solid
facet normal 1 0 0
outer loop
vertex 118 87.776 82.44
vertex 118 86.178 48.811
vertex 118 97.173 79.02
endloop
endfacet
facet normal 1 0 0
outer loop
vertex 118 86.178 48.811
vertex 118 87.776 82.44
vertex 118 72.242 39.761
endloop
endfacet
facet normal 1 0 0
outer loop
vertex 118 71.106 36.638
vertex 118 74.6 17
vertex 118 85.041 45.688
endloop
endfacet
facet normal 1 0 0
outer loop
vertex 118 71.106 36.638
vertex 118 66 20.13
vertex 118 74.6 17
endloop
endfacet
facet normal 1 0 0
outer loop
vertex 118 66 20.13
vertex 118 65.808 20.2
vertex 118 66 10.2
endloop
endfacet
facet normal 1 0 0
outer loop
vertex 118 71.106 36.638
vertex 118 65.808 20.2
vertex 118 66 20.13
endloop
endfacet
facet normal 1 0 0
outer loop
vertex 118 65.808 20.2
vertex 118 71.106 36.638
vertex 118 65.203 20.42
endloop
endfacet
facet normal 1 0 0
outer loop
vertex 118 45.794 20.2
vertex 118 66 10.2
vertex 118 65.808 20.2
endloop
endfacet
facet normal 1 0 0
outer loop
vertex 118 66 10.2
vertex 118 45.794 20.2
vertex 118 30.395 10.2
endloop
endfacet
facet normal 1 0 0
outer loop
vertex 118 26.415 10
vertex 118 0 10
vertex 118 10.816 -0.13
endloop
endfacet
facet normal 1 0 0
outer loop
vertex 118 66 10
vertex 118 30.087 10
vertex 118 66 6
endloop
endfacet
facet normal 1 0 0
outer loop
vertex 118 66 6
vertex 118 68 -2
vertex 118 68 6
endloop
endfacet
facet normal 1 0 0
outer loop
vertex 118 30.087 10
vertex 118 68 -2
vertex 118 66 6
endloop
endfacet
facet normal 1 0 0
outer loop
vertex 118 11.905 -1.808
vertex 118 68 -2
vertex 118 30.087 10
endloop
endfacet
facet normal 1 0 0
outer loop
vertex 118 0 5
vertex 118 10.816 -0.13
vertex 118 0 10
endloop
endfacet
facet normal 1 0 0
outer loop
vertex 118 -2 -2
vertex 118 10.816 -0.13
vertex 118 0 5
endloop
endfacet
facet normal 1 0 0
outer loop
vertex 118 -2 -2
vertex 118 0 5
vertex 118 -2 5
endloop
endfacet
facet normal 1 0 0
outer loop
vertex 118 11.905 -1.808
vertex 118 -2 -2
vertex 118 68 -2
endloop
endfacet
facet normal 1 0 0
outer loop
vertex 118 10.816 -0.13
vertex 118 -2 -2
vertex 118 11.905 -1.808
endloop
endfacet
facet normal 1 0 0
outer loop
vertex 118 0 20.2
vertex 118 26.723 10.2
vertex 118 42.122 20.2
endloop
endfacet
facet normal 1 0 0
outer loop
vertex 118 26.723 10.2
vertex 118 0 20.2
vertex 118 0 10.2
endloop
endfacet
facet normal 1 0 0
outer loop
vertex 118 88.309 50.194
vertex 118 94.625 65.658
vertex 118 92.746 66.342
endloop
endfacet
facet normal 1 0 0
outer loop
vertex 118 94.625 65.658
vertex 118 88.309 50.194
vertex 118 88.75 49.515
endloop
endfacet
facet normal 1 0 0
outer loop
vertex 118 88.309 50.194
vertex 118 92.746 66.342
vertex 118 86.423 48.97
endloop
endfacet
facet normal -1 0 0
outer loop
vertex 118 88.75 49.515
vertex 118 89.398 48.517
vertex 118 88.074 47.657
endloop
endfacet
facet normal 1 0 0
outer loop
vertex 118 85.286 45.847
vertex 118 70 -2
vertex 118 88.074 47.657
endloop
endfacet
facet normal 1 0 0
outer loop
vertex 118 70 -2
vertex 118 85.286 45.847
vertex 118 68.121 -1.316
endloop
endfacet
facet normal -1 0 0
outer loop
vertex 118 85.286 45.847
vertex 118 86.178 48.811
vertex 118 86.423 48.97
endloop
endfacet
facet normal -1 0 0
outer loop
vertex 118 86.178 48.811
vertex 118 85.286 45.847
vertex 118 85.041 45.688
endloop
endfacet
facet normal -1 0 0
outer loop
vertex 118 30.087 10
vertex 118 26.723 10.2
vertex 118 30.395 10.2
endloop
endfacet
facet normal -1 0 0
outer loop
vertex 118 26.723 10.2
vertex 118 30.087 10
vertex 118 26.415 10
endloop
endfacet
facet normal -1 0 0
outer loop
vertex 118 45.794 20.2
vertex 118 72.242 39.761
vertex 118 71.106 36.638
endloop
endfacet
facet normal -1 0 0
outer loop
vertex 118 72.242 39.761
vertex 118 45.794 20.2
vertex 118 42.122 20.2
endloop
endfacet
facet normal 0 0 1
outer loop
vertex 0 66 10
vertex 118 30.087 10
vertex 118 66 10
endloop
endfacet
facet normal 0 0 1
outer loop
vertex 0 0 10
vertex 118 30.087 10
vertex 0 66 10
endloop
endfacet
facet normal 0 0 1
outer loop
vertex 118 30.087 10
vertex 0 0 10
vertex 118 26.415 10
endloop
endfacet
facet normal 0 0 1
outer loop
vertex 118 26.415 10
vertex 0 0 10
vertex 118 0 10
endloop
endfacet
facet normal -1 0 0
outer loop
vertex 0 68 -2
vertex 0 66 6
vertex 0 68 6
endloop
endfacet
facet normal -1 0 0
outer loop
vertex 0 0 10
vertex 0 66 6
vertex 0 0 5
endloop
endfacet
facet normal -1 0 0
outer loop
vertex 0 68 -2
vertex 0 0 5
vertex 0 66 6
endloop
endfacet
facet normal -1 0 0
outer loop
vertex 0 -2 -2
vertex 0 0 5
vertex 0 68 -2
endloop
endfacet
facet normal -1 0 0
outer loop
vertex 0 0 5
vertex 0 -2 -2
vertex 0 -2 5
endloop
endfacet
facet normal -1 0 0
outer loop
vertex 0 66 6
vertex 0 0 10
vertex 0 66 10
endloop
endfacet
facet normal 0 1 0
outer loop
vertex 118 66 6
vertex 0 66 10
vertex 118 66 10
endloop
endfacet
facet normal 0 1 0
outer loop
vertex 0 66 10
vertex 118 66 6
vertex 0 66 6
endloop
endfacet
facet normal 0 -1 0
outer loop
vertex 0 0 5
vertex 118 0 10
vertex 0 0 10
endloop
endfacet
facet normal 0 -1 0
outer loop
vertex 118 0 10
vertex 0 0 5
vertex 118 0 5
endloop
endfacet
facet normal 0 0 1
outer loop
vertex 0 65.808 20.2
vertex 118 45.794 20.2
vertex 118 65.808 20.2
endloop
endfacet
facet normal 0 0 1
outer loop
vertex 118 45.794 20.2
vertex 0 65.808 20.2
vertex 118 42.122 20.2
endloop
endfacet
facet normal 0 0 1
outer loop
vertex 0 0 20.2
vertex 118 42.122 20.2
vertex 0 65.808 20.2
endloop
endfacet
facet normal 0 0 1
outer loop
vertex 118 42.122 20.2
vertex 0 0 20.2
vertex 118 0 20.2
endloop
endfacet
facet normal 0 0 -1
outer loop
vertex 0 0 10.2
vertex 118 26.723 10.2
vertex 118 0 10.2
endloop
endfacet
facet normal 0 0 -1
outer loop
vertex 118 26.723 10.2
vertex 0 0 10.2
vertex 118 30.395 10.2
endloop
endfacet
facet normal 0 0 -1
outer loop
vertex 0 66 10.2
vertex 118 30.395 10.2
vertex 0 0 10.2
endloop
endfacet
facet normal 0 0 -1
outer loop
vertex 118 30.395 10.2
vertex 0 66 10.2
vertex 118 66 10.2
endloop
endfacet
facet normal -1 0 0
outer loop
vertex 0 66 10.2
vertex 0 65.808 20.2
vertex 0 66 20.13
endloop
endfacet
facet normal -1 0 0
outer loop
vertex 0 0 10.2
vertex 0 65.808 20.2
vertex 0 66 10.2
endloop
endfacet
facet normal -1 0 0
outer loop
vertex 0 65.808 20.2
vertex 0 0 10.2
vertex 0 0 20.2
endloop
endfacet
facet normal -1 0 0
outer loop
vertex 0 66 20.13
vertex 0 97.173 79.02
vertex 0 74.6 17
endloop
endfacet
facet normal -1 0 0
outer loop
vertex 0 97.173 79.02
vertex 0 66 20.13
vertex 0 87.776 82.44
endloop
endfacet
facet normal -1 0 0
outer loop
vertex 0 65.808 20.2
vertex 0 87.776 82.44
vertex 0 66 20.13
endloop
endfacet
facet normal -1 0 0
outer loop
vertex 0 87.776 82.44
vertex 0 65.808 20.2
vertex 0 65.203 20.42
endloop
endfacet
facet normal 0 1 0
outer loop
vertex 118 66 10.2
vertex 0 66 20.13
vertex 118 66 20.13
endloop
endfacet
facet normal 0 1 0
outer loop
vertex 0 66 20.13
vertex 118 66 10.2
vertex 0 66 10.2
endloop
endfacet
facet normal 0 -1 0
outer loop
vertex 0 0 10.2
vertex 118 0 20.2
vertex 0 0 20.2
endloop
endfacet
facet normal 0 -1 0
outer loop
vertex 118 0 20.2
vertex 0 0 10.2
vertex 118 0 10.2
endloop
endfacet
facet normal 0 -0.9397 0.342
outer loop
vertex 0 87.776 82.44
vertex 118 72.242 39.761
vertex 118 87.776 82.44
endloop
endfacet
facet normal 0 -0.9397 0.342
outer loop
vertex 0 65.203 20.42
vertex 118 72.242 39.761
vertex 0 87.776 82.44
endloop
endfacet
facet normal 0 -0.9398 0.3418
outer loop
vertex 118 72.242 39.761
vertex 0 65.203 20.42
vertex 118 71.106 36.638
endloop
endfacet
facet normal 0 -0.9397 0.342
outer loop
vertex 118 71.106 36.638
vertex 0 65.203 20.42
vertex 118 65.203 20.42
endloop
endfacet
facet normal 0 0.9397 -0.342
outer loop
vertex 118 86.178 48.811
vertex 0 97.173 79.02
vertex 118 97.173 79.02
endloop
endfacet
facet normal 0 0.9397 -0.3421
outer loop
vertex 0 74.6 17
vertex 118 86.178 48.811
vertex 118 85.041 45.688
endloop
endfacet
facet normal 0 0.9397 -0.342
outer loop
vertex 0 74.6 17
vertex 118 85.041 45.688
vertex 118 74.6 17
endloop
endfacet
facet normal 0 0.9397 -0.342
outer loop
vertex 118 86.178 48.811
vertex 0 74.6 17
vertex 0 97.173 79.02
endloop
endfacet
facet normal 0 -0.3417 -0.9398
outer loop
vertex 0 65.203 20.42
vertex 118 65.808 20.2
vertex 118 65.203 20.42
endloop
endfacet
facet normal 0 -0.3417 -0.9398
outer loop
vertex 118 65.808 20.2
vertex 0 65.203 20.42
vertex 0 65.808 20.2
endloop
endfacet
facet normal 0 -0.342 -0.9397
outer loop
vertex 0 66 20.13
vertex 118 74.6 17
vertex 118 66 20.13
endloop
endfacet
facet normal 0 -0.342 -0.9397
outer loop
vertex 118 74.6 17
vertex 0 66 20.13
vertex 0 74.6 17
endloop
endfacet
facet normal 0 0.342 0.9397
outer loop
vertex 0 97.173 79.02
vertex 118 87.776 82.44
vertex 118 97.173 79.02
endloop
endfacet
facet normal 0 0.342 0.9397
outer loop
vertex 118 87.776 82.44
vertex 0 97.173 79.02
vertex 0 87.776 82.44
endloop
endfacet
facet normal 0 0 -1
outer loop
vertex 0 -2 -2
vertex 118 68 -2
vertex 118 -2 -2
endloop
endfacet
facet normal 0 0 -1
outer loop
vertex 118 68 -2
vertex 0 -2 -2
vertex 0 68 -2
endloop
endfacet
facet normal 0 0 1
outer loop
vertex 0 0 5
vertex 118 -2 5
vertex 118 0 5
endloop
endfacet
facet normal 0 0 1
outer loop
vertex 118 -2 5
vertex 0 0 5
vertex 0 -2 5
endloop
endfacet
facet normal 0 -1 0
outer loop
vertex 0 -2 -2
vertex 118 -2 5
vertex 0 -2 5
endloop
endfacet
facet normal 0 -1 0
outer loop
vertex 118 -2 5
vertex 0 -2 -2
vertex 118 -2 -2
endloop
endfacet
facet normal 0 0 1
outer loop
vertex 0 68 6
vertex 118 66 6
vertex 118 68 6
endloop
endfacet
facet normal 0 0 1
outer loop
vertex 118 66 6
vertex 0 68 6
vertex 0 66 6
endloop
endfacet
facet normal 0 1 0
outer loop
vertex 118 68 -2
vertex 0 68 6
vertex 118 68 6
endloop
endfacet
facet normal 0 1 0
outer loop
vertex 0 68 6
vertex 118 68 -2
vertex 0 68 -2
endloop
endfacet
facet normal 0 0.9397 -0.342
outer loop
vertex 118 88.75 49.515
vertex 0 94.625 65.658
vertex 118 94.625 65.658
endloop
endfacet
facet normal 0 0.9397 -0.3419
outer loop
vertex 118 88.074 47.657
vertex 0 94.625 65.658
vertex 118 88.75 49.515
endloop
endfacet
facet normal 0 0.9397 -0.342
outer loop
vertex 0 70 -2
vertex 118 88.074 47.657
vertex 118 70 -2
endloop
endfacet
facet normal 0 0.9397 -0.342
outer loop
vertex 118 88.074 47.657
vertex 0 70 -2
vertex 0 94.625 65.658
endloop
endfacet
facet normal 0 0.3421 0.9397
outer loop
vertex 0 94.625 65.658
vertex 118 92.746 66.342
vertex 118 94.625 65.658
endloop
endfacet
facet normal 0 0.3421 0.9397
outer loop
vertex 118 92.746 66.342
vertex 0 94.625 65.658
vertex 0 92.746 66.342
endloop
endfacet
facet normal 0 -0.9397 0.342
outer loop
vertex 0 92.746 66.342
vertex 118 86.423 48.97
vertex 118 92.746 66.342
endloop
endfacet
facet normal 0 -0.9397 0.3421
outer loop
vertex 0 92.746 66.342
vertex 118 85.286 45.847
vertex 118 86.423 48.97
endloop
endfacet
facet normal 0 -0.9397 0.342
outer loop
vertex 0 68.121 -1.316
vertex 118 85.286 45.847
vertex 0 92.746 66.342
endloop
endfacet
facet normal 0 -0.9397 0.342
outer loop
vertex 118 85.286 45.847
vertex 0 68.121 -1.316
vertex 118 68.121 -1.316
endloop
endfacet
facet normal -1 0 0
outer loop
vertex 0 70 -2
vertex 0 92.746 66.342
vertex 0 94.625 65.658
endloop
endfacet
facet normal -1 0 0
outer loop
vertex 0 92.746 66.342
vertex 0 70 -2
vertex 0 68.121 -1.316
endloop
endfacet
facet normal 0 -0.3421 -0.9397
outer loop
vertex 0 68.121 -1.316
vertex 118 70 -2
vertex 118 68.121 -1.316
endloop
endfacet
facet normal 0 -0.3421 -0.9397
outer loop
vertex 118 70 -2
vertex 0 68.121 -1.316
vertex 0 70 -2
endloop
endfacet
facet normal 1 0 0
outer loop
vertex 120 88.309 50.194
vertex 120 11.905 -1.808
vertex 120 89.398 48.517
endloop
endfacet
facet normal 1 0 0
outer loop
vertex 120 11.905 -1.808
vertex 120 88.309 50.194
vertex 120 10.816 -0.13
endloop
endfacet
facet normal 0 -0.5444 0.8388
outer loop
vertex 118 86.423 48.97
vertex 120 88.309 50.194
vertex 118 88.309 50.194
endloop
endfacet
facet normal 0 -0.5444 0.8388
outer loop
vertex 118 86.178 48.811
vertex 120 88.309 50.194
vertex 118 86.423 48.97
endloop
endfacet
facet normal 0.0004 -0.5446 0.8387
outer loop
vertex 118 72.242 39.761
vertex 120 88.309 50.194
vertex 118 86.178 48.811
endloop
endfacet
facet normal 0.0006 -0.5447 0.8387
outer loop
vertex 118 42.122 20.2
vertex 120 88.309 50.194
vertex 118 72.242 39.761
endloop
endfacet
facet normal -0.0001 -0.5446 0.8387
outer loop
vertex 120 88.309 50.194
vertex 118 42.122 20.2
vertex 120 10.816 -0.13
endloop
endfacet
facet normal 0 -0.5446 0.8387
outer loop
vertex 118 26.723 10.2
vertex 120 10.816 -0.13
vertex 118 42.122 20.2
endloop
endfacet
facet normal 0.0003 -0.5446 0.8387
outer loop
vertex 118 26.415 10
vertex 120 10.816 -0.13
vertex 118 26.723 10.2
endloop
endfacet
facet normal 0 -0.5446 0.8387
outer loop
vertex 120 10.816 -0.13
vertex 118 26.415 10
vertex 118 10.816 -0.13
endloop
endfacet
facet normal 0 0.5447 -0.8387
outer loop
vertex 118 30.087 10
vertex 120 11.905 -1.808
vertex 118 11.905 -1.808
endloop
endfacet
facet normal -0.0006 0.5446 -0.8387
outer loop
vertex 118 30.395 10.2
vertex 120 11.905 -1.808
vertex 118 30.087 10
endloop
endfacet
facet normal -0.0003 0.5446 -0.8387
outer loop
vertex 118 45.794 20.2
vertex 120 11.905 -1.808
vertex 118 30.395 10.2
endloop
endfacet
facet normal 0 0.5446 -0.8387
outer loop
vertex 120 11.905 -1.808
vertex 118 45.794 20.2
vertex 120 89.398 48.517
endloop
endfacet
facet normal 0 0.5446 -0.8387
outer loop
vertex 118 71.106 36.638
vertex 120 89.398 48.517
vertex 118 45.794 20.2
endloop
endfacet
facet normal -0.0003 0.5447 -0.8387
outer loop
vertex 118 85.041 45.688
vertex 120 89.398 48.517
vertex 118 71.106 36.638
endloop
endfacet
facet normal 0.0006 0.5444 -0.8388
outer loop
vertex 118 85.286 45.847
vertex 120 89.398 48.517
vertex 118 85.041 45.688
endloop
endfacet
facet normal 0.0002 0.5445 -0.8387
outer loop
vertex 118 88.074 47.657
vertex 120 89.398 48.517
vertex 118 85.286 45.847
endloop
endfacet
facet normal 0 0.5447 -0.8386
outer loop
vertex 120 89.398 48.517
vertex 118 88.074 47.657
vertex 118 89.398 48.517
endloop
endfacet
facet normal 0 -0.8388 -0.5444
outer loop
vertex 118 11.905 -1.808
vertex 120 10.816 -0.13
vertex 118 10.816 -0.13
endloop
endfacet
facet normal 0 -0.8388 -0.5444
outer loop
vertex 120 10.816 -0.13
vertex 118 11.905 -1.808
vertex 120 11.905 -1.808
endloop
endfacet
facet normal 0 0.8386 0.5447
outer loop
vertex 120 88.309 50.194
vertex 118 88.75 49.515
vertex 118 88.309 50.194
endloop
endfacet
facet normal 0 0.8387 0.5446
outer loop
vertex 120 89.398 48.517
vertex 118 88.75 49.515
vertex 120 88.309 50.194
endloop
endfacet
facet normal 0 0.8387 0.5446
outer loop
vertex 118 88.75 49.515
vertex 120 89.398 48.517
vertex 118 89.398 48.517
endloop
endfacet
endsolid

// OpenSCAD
//Hoehe eine Matte
hm = 10;
//Hoehe Matte Diff
hmd = -1.4;
//Tiefe Matte
tm = 66;
//Tiefe Matte Diff
tmd = -3;
//Breite Matte
bm = 118;
//Dicke weisses Brett
dwb = 2;
//Dicker Leimholzbrett
dlb = 2;

//Rotation
r = 70;

//194x92,5x2 1x
//180x18x2   2x
//180x8x2    1x

module matte()
{
    color("#777777")
    cube([bm,tm,hm]);
}

module klappmatte()
{
    matte();

    translate([0,0,hm+0.2])
    matte();

    translate([0,tm+hm+hmd,hm*2+tmd])
    rotate([r,0,0])
    matte();
}

klappmatte();

module brett_sitzflaeche()
{
    color("#BA8C63")
    translate([0,0,-dlb])
    cube([bm,tm,dlb]);
}

brett_sitzflaeche();

module brett_sitzflaeche_begrenzung_hinten_vorne(s, isWhitePlank)
{
    if (isWhitePlank)
    {
        //color("#BA8C63")
        cube([bm,dwb,hm*0.5+dwb+s]);
    }
    else
    {
        color("#BA8C63")
        cube([bm,dlb,hm*0.5+dlb+s]);   
    }
}

module brett_sitzflaeche_begrenzung_vorne()
{
    translate([0,-dwb,-dlb])
    brett_sitzflaeche_begrenzung_hinten_vorne(0, true);
}

module brett_sitzflaeche_begrenzung_hinten()
{
    translate([0,tm,-dlb])
    brett_sitzflaeche_begrenzung_hinten_vorne(1, false);
}

brett_sitzflaeche_begrenzung_vorne();
brett_sitzflaeche_begrenzung_hinten();

module brett_hinten()
{
    color("#BA8C63")
    
    translate([0,tm+4,-2])
    rotate([r,0,0])
    cube([bm,tm+6,dlb]);
}

brett_hinten();

rotate([33,0,0])
translate([bm,9,-8])
cube([dlb,tm*1.4,dlb]);
